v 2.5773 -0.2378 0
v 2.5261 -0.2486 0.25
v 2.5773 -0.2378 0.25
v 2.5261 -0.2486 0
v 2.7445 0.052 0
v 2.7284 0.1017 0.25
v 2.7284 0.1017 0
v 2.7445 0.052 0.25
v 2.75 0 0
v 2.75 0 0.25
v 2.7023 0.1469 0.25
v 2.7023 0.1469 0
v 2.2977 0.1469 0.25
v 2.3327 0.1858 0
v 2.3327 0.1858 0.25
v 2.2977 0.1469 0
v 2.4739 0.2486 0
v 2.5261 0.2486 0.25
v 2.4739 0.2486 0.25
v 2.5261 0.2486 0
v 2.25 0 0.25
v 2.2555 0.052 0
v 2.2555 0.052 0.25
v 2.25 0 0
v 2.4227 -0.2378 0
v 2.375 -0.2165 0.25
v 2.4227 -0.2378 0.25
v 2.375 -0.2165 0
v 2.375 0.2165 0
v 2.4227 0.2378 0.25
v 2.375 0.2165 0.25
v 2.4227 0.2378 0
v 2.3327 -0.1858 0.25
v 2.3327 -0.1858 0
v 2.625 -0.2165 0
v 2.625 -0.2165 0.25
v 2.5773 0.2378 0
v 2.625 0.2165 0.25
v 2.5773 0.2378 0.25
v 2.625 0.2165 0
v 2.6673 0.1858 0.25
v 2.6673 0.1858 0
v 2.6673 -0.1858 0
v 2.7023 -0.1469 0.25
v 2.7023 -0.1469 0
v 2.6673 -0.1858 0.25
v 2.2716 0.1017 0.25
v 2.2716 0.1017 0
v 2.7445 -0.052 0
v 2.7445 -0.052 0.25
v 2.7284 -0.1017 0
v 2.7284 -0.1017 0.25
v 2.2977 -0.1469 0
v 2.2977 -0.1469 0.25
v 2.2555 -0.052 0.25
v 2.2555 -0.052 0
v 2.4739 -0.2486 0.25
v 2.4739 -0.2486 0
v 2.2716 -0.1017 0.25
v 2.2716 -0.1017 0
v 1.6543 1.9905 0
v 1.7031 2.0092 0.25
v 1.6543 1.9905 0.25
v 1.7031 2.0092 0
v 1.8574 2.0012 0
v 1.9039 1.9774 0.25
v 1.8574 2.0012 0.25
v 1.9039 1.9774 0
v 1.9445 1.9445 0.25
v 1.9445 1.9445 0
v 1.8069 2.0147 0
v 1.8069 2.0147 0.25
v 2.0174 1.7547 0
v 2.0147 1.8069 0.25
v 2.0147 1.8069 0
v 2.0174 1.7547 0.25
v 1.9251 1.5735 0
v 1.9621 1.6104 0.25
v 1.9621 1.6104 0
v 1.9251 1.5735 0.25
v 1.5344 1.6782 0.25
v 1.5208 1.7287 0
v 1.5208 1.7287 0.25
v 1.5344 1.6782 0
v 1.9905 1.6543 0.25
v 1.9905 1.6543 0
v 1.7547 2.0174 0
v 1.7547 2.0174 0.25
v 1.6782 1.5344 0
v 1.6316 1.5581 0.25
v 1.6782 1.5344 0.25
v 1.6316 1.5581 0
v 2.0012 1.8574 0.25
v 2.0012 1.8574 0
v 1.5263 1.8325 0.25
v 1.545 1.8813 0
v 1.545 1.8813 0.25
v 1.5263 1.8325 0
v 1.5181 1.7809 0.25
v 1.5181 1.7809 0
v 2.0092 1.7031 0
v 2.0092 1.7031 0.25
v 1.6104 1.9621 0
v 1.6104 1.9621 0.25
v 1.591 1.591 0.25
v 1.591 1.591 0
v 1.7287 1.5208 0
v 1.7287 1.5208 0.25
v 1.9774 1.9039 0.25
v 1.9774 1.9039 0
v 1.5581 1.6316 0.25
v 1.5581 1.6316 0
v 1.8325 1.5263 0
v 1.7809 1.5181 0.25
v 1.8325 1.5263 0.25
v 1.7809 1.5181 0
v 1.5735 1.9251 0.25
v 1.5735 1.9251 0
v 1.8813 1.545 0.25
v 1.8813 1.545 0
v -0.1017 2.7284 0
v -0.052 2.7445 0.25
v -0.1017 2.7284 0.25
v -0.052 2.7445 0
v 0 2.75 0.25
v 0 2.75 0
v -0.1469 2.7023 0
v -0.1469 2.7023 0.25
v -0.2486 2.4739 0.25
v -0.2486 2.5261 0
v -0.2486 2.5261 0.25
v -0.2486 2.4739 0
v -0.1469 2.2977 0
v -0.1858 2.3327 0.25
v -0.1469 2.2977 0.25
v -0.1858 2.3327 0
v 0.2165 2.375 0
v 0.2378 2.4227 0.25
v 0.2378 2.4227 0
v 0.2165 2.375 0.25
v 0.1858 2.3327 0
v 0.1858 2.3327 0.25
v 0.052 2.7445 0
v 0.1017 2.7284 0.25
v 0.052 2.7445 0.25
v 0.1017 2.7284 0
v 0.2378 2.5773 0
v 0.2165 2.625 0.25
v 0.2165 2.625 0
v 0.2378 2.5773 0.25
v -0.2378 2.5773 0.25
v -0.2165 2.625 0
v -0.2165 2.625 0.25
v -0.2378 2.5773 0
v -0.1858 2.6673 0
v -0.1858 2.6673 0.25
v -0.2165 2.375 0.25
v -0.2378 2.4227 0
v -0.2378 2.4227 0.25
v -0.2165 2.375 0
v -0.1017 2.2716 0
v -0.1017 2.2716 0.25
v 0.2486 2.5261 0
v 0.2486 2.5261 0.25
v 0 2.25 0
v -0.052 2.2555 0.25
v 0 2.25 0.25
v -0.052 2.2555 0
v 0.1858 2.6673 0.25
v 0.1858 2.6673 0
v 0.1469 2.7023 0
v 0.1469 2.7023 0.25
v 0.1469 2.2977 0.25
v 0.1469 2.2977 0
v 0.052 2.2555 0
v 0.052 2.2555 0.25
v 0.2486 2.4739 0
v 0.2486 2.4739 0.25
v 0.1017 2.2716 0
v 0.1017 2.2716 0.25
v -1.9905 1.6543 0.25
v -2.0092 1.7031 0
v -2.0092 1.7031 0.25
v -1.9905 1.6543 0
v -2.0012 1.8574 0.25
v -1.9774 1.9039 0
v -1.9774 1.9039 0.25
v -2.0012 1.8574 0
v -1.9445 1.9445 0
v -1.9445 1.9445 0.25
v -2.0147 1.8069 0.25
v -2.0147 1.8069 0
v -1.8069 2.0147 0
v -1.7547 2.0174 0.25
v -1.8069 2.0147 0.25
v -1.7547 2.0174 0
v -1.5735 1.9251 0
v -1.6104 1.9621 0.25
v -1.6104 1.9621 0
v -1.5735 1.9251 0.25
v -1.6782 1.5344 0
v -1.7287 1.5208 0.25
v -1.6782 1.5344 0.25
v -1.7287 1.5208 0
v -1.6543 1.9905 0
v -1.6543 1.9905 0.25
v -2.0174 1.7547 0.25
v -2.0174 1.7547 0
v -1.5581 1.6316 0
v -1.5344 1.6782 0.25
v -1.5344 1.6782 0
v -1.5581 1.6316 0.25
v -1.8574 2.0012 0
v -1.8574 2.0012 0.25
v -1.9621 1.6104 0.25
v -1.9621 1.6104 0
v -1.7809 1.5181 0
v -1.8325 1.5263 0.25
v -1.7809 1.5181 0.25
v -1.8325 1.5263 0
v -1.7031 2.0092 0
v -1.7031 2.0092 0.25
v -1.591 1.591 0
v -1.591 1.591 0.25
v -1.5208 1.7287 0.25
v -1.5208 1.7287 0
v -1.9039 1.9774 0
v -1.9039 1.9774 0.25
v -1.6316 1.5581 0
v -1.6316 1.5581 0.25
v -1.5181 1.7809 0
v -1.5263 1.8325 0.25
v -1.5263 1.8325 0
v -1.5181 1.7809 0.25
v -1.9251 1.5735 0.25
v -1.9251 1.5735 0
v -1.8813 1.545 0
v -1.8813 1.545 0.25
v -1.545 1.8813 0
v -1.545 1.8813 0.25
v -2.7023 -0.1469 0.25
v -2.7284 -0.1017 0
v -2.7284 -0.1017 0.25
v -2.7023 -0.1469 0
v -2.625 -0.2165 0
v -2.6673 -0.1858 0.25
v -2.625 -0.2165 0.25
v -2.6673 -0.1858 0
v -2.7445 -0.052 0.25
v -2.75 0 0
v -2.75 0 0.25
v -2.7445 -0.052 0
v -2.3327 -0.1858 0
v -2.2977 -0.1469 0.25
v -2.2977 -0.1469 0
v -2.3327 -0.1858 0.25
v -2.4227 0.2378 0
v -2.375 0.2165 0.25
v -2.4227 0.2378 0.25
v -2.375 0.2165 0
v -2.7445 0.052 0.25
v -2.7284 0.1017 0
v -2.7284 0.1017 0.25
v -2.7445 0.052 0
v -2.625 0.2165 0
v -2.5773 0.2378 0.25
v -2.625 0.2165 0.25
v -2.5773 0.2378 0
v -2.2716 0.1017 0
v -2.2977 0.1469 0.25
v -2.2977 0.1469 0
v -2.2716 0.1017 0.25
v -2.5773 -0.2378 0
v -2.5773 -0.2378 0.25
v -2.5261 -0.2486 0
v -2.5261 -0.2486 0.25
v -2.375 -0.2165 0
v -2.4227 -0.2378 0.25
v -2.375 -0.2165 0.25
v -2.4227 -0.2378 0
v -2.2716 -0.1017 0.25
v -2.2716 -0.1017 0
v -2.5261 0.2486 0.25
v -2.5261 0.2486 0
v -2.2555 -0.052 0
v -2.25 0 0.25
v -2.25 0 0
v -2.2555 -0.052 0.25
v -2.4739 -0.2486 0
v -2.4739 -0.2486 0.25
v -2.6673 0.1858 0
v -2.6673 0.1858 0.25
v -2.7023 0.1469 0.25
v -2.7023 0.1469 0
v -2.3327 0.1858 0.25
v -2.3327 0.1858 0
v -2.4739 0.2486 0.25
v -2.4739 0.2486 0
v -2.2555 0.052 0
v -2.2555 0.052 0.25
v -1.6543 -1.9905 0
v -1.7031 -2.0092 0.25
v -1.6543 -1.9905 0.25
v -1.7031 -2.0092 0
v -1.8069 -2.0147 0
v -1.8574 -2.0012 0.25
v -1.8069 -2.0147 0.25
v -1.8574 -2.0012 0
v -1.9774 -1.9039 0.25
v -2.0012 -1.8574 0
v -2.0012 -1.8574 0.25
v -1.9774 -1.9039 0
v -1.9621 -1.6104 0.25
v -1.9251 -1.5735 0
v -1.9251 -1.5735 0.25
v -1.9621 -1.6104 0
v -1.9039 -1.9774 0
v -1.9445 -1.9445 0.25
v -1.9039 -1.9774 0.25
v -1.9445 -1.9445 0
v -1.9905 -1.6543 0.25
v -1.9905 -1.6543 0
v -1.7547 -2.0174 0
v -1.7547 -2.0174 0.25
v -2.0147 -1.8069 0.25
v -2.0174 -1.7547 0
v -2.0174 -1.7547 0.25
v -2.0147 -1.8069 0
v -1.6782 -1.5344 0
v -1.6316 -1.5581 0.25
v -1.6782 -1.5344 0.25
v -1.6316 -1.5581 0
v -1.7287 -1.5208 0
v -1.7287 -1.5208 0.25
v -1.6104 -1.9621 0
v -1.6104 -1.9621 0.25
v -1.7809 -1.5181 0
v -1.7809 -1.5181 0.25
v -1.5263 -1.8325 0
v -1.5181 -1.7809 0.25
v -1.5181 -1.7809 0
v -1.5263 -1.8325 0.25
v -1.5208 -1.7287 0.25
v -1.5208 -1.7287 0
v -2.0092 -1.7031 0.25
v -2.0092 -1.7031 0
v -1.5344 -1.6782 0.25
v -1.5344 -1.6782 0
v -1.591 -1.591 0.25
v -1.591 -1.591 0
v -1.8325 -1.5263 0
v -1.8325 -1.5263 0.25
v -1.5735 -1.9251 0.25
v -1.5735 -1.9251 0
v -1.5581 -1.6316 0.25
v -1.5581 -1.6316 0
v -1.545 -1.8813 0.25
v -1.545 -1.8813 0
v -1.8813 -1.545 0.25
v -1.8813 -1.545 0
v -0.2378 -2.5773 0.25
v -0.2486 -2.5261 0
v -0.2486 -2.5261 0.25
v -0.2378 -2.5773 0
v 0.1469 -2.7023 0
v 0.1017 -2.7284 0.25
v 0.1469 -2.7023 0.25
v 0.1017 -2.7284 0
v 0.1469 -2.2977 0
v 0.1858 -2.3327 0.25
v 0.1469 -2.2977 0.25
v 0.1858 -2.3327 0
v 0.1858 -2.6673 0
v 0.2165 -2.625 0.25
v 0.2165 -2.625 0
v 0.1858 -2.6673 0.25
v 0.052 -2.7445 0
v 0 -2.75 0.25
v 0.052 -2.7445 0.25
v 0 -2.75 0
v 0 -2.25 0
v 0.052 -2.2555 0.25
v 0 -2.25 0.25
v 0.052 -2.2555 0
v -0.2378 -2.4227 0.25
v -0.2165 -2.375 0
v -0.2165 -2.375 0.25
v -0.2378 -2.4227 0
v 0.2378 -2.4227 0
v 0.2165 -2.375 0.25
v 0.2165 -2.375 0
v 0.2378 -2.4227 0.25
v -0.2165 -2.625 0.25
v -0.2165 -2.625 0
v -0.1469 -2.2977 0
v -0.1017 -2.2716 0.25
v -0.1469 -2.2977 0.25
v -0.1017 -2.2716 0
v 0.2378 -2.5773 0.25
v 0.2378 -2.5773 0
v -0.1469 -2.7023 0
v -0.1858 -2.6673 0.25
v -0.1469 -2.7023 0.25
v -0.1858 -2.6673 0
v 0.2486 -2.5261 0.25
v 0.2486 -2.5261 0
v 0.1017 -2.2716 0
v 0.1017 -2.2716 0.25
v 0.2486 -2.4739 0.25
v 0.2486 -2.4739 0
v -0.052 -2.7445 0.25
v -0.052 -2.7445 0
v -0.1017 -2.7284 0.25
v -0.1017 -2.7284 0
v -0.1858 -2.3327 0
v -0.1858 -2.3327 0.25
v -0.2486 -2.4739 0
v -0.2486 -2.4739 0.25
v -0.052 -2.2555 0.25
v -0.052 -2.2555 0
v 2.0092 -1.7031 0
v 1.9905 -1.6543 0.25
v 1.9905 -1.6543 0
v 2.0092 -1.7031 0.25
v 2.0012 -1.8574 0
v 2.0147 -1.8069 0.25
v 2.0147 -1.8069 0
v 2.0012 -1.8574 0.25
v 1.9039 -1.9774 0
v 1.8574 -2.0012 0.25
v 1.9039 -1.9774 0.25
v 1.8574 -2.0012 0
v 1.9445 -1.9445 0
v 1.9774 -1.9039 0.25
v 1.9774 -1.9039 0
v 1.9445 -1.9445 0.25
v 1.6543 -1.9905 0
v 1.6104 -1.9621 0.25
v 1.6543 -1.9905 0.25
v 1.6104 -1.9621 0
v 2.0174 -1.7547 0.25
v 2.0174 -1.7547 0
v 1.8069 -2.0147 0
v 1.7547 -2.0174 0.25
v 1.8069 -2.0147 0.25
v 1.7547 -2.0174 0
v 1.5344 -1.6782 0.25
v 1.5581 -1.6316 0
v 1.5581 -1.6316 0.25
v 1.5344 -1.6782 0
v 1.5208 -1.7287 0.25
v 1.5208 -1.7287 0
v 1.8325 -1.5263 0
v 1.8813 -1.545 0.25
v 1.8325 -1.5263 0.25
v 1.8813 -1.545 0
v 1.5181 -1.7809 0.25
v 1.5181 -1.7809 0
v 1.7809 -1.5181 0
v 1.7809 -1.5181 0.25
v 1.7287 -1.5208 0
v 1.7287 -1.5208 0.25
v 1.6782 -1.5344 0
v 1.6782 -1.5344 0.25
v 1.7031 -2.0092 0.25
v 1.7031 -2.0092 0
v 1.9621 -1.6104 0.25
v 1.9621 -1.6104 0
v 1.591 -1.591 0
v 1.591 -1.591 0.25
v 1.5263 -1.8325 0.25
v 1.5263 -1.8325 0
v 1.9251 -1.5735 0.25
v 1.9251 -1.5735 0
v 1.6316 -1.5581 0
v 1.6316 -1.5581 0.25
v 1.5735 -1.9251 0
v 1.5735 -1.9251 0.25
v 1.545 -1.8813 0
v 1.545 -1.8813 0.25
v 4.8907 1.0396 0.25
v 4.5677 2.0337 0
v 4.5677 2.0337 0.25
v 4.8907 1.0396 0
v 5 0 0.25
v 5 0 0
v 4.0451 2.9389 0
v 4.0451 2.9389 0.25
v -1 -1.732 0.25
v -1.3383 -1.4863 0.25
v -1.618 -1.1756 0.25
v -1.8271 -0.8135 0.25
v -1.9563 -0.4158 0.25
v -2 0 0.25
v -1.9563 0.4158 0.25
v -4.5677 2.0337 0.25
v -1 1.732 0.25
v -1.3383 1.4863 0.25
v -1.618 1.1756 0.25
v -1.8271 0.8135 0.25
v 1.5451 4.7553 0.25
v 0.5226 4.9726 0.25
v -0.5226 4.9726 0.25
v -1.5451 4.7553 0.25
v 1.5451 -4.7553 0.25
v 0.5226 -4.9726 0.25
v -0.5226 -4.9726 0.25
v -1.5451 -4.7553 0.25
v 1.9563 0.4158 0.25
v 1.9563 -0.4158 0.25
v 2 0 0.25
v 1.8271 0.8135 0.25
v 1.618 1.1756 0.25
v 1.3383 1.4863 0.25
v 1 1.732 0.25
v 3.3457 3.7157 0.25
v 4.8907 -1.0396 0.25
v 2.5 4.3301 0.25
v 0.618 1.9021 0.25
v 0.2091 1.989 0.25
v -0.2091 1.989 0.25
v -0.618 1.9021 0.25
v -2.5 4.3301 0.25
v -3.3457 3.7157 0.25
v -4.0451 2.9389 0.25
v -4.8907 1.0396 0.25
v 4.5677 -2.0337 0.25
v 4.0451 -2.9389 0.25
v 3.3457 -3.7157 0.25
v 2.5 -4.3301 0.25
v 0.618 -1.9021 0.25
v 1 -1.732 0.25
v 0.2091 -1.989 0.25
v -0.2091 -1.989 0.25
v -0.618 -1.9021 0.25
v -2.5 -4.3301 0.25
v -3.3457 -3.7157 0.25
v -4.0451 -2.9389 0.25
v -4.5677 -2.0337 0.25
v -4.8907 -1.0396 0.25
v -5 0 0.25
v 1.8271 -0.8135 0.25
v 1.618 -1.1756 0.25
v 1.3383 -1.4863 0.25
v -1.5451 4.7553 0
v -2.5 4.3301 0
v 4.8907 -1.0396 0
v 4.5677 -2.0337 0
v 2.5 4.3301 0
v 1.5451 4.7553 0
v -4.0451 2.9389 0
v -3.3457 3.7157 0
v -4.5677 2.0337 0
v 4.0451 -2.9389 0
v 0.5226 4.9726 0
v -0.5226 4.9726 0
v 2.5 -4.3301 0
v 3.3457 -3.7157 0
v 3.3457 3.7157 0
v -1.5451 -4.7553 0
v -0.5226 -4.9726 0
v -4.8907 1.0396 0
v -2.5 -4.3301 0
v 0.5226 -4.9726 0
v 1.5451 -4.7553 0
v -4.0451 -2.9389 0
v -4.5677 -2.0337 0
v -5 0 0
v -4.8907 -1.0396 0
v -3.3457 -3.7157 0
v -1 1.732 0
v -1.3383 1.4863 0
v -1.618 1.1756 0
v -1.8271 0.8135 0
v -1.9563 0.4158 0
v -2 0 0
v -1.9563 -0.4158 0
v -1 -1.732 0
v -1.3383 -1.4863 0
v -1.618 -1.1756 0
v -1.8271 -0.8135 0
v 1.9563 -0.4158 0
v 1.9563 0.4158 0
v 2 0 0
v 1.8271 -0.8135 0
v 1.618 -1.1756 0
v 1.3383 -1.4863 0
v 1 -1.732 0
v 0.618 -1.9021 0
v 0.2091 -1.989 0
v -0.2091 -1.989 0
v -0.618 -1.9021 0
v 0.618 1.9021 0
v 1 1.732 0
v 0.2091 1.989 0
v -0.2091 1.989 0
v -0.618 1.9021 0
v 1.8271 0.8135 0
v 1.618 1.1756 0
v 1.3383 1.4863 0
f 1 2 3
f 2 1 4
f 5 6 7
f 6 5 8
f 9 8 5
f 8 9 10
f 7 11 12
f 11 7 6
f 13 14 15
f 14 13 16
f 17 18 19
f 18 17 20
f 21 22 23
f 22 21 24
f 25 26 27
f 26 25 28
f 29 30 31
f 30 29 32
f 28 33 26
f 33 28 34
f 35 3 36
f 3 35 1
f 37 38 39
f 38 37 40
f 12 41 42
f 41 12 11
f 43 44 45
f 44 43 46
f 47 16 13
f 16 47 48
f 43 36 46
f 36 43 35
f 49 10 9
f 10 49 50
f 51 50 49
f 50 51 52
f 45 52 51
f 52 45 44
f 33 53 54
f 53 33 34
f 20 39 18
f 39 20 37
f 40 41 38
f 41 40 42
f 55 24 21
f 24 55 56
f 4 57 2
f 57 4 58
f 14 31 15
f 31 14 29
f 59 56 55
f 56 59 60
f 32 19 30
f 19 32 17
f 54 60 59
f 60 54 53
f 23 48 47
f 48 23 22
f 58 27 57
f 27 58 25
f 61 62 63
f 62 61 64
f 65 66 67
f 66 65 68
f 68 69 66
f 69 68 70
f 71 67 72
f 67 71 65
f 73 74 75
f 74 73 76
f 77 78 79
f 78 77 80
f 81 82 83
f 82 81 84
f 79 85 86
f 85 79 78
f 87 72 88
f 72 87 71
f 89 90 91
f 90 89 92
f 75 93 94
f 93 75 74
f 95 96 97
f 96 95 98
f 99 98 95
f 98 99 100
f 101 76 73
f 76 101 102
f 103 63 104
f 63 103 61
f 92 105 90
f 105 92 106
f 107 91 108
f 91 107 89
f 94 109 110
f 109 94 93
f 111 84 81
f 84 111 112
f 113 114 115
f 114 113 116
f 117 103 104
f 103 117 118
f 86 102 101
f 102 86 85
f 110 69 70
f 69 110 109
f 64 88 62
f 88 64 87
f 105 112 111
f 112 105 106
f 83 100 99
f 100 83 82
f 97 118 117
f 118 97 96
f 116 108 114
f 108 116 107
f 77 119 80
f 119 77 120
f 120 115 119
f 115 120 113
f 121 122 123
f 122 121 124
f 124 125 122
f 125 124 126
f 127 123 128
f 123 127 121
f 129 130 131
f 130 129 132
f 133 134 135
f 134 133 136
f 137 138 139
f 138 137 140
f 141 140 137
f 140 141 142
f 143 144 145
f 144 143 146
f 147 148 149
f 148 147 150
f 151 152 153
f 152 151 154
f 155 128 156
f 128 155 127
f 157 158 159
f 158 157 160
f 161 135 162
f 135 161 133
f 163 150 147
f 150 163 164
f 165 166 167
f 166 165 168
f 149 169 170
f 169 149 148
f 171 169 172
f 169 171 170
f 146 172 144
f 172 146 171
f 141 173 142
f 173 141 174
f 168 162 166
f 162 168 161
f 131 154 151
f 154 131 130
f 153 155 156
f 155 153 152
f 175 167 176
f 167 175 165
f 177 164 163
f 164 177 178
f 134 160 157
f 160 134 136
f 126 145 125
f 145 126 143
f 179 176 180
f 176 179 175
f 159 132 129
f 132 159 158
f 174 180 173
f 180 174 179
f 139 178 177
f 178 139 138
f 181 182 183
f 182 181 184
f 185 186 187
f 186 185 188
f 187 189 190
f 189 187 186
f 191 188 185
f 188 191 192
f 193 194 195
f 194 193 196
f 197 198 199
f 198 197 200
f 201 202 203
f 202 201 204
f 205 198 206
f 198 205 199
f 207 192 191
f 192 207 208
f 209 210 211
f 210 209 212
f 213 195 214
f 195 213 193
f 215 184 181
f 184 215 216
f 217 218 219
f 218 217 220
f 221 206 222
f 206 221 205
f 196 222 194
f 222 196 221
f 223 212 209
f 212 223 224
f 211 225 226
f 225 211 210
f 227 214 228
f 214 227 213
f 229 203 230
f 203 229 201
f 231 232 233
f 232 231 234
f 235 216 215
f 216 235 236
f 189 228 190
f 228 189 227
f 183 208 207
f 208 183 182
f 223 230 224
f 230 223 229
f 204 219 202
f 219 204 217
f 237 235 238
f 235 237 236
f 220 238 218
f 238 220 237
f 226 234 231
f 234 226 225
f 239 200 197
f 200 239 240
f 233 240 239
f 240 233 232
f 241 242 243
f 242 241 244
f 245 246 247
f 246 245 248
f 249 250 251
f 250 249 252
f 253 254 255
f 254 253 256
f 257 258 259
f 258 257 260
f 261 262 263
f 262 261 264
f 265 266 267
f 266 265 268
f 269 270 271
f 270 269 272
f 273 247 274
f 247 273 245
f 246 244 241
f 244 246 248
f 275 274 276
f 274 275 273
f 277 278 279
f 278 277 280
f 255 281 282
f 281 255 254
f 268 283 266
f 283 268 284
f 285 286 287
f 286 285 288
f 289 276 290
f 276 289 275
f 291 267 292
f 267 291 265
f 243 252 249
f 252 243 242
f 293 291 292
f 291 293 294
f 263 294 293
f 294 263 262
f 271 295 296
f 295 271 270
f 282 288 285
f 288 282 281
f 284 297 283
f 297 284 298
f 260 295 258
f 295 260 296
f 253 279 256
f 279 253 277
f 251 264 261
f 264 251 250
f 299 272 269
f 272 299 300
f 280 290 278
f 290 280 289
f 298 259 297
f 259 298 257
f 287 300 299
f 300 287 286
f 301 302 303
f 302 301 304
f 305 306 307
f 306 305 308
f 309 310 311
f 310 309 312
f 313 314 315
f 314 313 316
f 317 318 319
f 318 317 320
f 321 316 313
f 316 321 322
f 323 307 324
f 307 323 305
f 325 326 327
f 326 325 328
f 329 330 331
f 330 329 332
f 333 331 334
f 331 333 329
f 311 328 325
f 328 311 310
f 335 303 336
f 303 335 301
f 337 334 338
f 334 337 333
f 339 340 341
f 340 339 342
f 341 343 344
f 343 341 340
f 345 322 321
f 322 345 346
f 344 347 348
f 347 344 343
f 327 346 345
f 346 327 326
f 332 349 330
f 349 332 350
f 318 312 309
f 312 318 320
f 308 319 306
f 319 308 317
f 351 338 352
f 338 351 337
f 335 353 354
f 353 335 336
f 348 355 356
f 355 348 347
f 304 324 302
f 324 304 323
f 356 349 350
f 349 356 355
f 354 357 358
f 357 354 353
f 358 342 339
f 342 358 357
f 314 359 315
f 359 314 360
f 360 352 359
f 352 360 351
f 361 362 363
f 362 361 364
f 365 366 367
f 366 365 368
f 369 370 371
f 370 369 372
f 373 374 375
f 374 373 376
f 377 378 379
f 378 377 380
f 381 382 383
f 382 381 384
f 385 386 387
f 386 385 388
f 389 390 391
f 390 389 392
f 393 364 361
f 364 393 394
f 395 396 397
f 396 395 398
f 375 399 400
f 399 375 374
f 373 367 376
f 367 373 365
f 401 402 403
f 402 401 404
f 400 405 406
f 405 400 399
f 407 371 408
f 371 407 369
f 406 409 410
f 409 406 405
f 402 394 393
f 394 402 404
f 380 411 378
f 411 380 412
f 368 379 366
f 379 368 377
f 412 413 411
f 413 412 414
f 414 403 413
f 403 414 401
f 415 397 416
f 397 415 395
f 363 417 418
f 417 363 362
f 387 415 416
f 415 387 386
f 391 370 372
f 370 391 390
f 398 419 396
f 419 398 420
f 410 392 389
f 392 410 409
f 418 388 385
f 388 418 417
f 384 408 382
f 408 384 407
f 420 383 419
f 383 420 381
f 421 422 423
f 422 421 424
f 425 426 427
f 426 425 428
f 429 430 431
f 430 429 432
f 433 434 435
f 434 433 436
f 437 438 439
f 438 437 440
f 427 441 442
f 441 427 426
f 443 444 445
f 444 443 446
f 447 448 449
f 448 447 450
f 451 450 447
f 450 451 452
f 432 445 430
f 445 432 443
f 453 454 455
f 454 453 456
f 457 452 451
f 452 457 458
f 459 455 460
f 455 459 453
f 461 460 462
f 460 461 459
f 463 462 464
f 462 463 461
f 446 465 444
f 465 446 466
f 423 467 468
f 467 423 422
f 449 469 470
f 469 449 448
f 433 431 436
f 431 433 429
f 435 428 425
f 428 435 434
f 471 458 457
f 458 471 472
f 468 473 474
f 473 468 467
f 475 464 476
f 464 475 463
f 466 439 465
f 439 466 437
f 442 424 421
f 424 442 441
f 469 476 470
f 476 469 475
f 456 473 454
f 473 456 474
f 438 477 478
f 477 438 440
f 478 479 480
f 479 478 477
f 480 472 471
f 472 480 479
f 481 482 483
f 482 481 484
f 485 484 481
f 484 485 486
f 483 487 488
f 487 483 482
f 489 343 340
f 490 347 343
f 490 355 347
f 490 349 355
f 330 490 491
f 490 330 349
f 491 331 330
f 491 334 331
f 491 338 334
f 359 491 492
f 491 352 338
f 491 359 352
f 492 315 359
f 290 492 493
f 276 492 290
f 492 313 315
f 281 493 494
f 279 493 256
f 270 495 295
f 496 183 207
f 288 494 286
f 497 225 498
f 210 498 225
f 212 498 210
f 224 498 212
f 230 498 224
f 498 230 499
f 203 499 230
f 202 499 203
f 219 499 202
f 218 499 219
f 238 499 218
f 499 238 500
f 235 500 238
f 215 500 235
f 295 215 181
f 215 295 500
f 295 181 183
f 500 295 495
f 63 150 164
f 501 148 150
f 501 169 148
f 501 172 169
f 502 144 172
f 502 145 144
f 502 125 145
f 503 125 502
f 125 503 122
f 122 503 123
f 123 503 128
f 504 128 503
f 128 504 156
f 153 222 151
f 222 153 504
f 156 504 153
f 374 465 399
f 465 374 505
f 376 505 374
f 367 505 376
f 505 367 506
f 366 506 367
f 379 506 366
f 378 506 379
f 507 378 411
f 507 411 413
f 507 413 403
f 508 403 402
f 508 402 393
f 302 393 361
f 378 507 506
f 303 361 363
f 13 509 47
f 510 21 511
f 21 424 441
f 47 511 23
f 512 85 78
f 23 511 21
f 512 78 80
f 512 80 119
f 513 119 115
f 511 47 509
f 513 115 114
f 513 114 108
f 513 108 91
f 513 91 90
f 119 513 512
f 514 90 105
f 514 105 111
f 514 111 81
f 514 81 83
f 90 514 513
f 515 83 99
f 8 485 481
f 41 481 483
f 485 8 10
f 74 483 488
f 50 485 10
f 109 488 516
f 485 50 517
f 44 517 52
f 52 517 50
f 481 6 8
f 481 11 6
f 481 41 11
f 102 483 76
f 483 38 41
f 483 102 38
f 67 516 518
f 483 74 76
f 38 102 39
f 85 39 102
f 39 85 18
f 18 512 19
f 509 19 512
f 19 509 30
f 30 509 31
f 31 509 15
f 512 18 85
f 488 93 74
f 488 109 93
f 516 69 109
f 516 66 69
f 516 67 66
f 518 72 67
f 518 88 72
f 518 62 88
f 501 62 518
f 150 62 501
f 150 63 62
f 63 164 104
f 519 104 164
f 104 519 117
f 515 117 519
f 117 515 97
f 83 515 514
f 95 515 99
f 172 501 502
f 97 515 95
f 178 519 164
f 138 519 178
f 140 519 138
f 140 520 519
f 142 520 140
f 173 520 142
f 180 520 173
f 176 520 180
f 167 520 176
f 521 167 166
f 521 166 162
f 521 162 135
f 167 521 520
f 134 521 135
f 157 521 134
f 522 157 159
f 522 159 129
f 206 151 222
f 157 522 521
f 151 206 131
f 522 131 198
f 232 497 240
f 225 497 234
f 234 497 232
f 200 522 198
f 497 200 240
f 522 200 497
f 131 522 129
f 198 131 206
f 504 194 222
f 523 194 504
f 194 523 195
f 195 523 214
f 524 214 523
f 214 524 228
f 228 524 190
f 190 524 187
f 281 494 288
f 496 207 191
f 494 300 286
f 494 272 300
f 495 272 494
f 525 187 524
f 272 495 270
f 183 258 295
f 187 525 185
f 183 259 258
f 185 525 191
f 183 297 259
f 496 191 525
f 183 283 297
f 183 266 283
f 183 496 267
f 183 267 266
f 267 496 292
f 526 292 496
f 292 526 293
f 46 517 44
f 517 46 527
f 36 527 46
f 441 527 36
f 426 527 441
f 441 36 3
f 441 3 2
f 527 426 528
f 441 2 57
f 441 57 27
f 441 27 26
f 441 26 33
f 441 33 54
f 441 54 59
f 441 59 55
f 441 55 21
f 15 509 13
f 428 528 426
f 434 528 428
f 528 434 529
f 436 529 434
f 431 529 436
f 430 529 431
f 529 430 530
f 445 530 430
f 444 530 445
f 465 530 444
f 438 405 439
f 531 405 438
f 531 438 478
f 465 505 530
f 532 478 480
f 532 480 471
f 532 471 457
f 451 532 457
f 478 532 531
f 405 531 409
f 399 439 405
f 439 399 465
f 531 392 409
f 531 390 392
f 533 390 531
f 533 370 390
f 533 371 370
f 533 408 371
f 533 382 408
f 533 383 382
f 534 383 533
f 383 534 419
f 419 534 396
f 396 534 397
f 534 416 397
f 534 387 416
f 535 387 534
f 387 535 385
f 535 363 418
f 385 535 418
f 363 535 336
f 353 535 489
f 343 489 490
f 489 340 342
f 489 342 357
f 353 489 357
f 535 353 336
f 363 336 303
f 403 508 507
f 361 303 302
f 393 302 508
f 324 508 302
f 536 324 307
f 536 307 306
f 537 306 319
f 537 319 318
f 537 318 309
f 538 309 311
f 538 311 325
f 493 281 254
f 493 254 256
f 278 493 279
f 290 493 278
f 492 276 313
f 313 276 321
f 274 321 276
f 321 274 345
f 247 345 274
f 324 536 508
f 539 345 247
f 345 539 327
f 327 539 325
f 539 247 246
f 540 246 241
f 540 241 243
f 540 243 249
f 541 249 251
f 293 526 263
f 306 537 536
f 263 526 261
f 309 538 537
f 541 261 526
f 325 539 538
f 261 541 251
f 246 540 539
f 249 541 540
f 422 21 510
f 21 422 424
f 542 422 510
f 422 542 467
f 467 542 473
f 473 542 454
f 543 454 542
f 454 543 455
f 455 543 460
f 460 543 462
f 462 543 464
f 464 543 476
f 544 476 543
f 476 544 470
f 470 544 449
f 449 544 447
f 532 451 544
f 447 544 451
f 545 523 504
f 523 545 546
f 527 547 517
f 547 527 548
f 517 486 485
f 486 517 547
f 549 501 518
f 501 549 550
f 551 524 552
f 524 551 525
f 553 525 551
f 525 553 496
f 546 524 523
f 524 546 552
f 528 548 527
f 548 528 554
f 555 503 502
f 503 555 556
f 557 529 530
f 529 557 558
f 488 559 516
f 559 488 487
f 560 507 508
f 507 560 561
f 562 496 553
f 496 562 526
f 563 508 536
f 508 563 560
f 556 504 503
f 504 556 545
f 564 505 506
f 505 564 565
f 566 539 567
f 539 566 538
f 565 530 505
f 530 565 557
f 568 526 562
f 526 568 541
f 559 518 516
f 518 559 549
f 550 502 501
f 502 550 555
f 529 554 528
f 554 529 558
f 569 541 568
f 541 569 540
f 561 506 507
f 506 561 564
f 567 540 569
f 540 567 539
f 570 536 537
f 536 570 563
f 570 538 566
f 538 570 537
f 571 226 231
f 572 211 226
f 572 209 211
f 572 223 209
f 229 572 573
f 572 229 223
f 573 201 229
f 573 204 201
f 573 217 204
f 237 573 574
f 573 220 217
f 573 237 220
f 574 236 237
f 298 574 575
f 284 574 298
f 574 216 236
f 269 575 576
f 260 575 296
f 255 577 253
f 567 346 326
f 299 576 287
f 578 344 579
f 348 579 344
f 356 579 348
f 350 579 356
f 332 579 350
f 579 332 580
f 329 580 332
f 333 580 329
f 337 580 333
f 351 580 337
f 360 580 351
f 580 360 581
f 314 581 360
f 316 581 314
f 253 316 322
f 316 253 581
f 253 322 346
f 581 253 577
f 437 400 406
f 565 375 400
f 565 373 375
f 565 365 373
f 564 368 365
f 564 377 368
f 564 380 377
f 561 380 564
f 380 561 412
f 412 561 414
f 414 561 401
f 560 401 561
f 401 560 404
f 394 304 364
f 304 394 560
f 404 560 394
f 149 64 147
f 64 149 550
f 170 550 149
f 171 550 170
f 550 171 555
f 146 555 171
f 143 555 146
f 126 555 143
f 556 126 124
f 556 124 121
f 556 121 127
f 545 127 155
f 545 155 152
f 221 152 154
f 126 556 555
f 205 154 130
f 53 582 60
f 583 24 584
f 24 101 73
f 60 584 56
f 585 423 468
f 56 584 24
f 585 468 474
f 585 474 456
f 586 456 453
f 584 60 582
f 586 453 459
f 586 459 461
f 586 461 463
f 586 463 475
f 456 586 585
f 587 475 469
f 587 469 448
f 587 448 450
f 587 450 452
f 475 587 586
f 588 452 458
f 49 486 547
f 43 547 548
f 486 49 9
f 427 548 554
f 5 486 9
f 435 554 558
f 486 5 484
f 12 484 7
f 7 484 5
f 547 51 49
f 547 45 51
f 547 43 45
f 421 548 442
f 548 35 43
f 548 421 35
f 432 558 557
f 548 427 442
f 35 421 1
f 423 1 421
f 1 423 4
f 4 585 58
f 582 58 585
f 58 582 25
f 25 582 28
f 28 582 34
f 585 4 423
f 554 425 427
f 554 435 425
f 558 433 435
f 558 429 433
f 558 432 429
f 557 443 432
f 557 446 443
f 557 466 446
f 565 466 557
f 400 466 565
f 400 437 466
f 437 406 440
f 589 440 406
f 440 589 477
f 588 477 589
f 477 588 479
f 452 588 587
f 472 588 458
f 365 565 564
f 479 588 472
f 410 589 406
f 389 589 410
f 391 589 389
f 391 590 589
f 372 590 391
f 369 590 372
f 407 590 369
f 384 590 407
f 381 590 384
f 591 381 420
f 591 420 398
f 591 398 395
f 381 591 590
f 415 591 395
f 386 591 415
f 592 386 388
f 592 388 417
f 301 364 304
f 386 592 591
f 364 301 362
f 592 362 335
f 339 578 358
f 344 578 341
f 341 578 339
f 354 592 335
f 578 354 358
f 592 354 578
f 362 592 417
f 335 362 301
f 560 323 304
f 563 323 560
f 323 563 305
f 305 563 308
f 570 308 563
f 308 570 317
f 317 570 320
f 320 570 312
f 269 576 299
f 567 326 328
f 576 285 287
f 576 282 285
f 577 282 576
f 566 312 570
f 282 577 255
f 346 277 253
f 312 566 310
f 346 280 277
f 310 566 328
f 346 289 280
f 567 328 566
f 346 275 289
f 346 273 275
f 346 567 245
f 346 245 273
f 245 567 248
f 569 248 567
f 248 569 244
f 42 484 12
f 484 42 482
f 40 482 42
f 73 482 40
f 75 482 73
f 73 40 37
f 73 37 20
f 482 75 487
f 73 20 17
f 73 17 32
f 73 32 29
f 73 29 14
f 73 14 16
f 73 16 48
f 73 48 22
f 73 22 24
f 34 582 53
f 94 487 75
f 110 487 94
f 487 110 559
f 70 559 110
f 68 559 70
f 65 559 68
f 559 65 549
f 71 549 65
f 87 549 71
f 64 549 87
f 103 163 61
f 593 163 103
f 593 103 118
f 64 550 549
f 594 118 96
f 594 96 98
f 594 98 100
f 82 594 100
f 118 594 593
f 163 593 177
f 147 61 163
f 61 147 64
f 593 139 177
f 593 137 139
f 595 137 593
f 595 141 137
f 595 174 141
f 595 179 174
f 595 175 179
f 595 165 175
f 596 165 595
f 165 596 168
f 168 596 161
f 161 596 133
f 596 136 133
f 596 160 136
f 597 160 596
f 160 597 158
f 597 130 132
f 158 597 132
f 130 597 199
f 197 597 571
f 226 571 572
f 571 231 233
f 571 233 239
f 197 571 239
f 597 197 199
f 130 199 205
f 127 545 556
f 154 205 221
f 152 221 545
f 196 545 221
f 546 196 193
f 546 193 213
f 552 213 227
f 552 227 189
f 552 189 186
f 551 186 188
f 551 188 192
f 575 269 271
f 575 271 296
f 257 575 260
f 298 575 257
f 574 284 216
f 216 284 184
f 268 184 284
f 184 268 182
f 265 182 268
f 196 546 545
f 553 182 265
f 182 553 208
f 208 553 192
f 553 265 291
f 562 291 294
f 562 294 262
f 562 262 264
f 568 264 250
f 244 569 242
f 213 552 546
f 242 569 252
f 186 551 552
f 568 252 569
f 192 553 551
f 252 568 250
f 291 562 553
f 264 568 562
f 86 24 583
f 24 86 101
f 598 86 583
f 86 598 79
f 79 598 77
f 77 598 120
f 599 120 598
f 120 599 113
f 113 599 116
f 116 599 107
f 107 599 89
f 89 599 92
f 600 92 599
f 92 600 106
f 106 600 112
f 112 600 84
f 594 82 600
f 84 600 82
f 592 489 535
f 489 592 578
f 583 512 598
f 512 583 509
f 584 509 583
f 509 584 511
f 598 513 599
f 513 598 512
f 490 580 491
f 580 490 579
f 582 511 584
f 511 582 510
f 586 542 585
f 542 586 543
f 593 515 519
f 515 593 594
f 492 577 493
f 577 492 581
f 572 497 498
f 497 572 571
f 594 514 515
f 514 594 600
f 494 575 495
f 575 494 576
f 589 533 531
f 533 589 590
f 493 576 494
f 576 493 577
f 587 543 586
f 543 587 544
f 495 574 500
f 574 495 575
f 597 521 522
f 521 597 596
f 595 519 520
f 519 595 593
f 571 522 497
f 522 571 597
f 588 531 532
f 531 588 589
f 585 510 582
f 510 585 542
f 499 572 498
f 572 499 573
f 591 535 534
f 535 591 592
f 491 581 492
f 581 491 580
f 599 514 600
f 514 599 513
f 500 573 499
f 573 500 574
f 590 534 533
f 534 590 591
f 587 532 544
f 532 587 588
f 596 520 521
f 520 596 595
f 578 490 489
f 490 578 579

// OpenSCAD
// inspired by https://www.youtube.com/watch?v=aea0Ta7S8uk

$fn = 30;

thickness = .25;
outside_radius = 5;
inside_radius = 2;
hole_radius = 2.5;
hole_diameter = .5;
number_holes = 8;

difference() {
  cylinder(r = outside_radius, h = thickness);
  cylinder(r = inside_radius, h = thickness);

  for(x = [0 : number_holes]) {
    echo(x * 90);
    rotate(x * (360 / number_holes), [0, 0, 1]) {
      translate([hole_radius, 0, -1]) {
        cylinder(d = hole_diameter, h = thickness + 2);
      }
    }
  }
}
